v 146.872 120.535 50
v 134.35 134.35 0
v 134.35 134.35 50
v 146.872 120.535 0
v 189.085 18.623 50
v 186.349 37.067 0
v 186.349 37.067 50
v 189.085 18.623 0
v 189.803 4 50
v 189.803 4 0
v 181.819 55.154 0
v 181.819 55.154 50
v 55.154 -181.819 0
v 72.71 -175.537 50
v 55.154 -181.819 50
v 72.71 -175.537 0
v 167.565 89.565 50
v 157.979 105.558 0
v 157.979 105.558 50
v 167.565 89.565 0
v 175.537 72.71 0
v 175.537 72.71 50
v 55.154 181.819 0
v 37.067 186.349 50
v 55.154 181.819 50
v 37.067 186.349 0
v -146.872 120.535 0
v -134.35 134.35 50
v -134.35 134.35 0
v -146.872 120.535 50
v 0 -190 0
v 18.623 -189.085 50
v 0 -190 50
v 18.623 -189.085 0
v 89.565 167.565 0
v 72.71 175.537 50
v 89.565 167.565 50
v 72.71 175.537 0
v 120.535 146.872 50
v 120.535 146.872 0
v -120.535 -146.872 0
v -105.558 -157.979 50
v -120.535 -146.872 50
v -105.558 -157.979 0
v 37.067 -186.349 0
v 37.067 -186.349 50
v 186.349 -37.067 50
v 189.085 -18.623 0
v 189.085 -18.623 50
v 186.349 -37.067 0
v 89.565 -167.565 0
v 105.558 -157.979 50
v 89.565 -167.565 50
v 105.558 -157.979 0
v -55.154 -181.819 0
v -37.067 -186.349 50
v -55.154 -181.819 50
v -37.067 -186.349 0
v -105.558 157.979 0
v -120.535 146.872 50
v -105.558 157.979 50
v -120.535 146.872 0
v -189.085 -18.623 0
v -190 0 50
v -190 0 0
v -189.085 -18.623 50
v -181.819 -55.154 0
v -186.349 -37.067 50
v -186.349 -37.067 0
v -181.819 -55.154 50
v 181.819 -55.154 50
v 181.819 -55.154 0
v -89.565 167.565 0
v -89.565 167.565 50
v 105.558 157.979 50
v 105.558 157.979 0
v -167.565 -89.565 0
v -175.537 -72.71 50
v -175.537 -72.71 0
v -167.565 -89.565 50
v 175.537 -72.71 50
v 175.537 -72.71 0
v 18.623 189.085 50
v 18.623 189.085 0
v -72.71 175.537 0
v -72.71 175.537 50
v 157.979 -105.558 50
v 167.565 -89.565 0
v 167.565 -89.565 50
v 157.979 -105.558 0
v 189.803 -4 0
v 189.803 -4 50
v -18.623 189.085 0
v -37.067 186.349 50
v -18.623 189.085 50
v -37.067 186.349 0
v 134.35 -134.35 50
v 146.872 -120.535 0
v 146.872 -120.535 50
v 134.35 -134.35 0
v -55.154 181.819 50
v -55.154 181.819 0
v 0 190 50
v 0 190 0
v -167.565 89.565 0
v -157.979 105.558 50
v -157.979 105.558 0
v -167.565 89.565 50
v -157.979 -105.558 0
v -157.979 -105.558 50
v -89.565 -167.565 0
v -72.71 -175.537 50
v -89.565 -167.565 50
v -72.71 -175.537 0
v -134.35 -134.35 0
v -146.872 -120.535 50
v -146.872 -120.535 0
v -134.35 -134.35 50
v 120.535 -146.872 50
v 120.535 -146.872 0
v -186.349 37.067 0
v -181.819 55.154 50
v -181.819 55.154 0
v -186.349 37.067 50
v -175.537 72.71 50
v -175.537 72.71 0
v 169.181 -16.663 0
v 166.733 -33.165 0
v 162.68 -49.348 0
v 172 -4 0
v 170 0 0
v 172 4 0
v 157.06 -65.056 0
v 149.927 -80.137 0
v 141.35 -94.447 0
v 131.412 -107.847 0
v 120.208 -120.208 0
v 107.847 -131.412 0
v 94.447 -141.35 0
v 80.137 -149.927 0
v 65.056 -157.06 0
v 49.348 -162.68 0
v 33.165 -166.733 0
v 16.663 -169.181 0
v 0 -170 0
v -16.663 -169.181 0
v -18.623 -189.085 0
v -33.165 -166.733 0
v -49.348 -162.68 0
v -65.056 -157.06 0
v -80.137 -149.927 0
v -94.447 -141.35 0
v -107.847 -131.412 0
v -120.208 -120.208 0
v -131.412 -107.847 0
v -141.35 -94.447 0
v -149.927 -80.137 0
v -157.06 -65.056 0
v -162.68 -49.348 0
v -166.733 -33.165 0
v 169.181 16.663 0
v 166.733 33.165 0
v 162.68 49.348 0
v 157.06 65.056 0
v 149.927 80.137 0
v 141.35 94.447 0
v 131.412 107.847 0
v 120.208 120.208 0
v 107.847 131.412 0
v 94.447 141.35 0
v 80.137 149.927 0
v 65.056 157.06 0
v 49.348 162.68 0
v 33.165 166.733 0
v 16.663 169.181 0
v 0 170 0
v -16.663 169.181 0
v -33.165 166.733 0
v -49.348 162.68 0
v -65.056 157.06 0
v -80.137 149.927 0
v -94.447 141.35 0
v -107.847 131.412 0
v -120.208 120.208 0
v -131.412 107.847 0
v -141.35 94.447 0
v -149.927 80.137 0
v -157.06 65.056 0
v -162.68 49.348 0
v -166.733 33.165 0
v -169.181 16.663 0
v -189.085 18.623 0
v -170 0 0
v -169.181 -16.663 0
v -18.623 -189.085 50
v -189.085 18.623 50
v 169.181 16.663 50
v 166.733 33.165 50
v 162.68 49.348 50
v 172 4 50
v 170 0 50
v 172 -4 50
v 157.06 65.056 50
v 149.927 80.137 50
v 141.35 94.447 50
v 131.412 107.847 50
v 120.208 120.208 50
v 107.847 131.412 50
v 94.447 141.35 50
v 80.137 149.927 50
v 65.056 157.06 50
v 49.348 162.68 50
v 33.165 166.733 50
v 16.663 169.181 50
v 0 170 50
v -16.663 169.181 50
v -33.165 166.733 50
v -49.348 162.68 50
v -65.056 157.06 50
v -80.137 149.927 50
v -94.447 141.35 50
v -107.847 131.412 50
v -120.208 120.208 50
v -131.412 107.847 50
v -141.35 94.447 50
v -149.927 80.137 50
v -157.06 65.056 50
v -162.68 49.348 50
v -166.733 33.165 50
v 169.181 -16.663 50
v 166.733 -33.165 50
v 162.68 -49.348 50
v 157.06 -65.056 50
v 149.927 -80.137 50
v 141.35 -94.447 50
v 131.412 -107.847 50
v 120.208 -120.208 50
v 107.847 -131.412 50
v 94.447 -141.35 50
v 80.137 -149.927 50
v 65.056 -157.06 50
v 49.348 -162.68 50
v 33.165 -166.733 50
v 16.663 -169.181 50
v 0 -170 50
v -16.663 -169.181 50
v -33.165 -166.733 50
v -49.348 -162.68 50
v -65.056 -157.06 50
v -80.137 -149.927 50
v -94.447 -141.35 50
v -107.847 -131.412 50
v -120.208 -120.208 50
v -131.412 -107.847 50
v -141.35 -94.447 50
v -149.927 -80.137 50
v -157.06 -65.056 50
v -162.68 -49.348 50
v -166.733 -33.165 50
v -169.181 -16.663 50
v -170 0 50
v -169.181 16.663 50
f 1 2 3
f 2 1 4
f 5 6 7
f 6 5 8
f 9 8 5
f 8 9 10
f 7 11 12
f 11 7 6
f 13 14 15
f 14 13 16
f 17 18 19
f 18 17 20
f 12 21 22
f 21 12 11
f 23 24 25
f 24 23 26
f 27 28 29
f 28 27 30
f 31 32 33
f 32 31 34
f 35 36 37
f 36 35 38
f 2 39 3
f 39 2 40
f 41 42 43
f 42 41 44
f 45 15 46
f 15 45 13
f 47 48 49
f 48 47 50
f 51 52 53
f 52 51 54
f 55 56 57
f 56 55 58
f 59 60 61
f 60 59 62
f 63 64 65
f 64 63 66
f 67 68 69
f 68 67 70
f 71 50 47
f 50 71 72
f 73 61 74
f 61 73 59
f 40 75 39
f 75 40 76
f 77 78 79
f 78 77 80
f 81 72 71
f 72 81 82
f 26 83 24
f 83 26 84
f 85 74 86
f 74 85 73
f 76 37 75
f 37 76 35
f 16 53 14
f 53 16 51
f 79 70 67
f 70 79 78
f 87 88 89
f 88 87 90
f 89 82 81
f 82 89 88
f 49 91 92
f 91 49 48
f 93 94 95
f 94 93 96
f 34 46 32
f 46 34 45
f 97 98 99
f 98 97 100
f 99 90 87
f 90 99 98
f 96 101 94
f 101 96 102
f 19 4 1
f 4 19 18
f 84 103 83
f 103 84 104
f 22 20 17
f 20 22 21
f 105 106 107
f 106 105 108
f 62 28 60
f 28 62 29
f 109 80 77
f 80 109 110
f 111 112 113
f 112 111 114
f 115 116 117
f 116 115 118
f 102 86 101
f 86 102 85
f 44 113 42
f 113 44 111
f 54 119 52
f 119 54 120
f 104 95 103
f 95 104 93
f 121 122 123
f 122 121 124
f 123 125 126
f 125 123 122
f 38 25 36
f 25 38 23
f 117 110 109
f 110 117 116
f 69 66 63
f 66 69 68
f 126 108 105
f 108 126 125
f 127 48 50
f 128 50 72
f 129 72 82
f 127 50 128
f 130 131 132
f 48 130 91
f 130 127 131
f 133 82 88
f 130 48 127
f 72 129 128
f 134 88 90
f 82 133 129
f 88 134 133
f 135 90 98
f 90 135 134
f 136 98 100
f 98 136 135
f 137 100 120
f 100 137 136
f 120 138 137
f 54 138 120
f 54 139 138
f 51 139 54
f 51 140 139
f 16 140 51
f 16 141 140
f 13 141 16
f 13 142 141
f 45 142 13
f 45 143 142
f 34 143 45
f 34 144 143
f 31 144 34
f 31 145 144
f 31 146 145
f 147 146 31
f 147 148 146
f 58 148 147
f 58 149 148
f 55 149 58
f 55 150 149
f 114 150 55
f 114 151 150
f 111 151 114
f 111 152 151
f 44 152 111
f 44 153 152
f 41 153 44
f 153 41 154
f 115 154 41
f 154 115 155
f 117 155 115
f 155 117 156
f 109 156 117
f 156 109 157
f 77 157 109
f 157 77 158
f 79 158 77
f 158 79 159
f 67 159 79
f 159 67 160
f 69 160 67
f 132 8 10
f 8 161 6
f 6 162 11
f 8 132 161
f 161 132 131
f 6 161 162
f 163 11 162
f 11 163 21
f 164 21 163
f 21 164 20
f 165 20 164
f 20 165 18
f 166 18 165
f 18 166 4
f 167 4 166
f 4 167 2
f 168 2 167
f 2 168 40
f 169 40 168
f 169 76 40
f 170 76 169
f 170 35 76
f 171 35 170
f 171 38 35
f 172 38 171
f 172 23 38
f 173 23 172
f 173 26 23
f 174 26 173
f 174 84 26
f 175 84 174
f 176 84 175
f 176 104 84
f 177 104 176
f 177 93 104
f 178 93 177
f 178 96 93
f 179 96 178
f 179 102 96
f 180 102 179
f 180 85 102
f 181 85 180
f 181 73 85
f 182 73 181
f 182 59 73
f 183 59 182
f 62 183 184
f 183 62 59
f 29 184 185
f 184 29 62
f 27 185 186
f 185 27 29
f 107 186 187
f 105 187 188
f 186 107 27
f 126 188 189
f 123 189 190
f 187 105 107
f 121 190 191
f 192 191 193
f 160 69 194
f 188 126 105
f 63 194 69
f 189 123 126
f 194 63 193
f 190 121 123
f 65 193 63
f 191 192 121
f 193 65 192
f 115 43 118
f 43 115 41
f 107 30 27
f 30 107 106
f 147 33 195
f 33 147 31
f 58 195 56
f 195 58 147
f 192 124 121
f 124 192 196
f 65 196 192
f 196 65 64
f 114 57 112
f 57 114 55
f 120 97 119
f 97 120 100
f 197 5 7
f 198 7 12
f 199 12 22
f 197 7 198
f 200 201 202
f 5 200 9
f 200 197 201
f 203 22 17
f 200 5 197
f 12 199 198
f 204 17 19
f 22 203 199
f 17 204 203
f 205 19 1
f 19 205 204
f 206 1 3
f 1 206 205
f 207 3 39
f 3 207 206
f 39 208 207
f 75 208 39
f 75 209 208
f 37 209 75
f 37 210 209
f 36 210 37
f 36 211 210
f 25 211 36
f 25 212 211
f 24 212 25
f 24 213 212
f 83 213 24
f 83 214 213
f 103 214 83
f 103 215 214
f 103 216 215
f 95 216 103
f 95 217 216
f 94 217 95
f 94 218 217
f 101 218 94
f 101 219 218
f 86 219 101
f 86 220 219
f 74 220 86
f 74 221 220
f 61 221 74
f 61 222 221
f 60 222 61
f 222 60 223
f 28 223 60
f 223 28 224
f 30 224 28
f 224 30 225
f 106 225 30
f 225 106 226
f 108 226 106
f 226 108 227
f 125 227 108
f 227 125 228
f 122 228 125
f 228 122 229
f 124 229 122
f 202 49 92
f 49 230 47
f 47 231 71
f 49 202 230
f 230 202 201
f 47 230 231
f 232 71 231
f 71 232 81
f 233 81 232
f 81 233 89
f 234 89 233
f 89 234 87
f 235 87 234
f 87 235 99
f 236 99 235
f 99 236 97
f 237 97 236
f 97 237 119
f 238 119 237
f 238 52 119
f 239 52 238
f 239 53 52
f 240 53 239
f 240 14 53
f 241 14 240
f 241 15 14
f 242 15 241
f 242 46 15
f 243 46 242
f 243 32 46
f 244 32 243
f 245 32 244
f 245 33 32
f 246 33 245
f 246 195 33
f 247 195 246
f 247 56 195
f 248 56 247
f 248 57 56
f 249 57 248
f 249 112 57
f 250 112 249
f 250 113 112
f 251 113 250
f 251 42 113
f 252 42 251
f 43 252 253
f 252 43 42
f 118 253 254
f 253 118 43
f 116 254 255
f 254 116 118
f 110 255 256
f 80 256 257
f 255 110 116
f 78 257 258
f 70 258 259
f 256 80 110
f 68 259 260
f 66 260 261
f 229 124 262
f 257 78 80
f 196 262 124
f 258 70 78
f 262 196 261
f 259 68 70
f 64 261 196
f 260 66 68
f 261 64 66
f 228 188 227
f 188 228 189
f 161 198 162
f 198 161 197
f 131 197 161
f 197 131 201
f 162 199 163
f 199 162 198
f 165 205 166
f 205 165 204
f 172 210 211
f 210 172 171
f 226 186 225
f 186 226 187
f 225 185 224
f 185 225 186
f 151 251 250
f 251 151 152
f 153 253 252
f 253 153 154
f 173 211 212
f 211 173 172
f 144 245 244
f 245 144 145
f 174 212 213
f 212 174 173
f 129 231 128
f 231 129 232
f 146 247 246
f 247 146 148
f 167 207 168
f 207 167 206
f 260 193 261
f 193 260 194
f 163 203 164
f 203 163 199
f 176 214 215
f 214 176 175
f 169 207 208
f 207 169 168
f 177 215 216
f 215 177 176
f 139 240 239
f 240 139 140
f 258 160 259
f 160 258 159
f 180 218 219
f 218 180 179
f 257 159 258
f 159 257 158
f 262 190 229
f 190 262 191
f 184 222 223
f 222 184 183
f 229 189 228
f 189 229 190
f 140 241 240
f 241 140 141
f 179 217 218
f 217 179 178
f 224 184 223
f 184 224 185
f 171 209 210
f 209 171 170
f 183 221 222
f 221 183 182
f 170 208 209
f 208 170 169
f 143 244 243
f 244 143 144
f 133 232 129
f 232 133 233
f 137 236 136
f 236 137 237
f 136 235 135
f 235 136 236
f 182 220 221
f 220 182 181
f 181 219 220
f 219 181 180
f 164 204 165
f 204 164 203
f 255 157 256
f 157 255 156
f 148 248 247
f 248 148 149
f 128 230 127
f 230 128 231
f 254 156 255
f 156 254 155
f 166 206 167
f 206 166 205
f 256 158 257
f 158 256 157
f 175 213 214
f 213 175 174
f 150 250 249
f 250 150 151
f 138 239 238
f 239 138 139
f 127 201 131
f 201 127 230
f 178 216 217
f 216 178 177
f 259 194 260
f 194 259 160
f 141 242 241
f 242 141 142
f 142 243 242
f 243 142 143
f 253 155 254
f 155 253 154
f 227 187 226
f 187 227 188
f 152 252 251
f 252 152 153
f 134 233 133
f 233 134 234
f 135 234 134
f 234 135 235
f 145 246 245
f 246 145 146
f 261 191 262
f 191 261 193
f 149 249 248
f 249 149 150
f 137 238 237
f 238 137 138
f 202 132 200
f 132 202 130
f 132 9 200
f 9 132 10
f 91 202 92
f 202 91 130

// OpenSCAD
// file: ../params.scad
// Shared millimetre parameters. Keep in lockstep with freecad/params.py.
// Module scale: 150 kg/day wet train. Walls are CPVC sheet, not metal.

$fn = 36;

WALL        = 12;     // CPVC sheet thickness
FLOOR       = 16;     // floor plate (trough sits on this)

// LEACH CSTR 1 — inside liquor box
CSTR_L      = 2000;
CSTR_W      = 1200;
CSTR_H      = 1400;   // liquid + freeboard
FREEBOARD   = 200;

// CSTR 2 weir (same vessel, +X wall)
WEIR_W      = 450;
WEIR_CREST  = CSTR_H - FREEBOARD;   // from inner floor
WEIR_SLOT_H = 80;
WEIR_LIP    = 120;    // external spout projection

// CSTR 3 floor auger — injection-molded PVC / FG
AUGER_D     = 140;    // flight OD
AUGER_SHAFT = 40;
AUGER_PITCH = 110;
AUGER_TROUGH_W = 180;
AUGER_TROUGH_H = 110;
AUGER_OFFSET_Y = 280; // trough centreline from inner -Y wall
AUGER_INCLINE  = 28;  // deg, lifts out of liquor toward +X

// mixer / nozzles (lid)
MIXER_D     = 50;
GAS_D       = 80;     // acid-gas takeoff
DROP_X      = 80;     // inner-X of shred drop slot
DROP_L      = 400;
DROP_W      = 250;
DROP_COAM   = 80;     // raised coaming around the slot

// LEACHATE PUMP / coarse strainer — −X wall, opposite the weir
PUMP_D      = 80;     // DN80
PUMP_Z      = 450;    // centreline above inner floor (submerged)
PUMP_Y      = 900;    // centreline from inner −Y (away from auger)
STRAINER_L  = 180;
STRAINER_W  = 140;
STRAINER_H  = 160;

// mezzanine feed train
MEZZ_H      = 2200;   // platform top above tank outer floor
MEZZ_L      = 1600;   // platform length in −X
MEZZ_THK    = 12;
HOPPER_L    = 700;
HOPPER_W    = 600;
HOPPER_H    = 800;
SHRED_L     = 500;
SHRED_W     = 500;
SHRED_H     = 450;
CONV_W      = 240;
CONV_H      = 120;
CONV_PLATE  = 6;      // trough plate
CONV_FLANGE = 40;
CONV_SPRING_D = 50;
CONV_SPRING_H = 80;
CONV_BOLT   = 10;     // M10 clearance
CONV_LEN    = 1800;   // default standalone length; plant instance is computed
DUST_D      = 150;    // dust-hood outlet to DUST header
AUGER_LIFT_L = 700;

// dewater belts + split (Phase A 4–6)
FDEW_L      = 1800;
FDEW_W      = 450;
FDEW_H      = 80;
FDEW_RISE   = 120;    // solids end higher so liquor runs back to weir
SDEW_L      = 1400;
SDEW_W      = 220;
SDEW_H      = 80;
SPLIT_L     = 600;
SPLIT_W     = 500;
SPLIT_H     = 400;
STUB_L      = 400;
STUB_W      = 300;
STUB_H      = 250;

// EW funnel cell
EW_L        = 600;    // along aisle (overflow direction)
EW_W        = 420;    // anode-cathode depth
EW_H        = 650;    // rectangular body
EW_FUNNEL_H = 220;
EW_VALVE_D  = 50;
EW_VALVE_L  = 60;
EW_MEM_T    = 4;      // CEM
EW_SLOT     = 10;     // membrane cassette slot
EW_PITCH    = 750;    // aisle spacing, centre to centre
AISLE_X0    = 200;
AISLE_Y     = -(EW_W + 2*WALL) - 400;
AISLE_Z     = 400;
BUND_H      = 150;
BUND_PAD    = 250;
SUMP_L      = 400;
SUMP_W      = 400;
SUMP_H      = 300;
VDF_D       = 700;
VDF_L       = 900;
PAIL_W      = 180;
HDR_D       = 80;
HDR_Z       = 1400;
PYRO_D      = 320;
PYRO_L      = 2800;

// Campus envelopes — lockstep with freecad/params.py
FARM_X=12000; FARM_Y=8000; FARM_L=12000; FARM_W=8000; FARM_H=4500;
FAB_X=12000;  FAB_Y=-6000; FAB_L=8000;   FAB_W=6000;  FAB_H=4000;
HAB_X=-8000;  HAB_Y=8000;  HAB_L=8000;   HAB_W=6000;  HAB_H=3200;
CRYO_X=-6000; CRYO_Y=-4000; CRYO_L=4000; CRYO_W=3000; CRYO_H=3000;
MFG_X=2000;   MFG_Y=9000;  MFG_L=6000;   MFG_W=4000;  MFG_H=3500;

LIFE_Z_GREY=900; LIFE_Z_UPW=1100; LIFE_Z_ETCH=1300;
LIFE_Z_O2=2800; LIFE_Z_N2=3000; LIFE_Z_CO2=3200;
LIFE_D_GREY=50; LIFE_D_UPW=40; LIFE_D_ETCH=32;
LIFE_D_GAS=25; LIFE_D_CO2=40;
// main file
// Single induction ring that sits on the Ti pyro shell. Repeat along PYRO_L.
include <../params.scad>;
$fn = 64;

coil_id = PYRO_D + 20;
coil_od = coil_id + 40;
coil_h  = 50;

module coil() {
    difference() {
        cylinder(h=coil_h, d=coil_od);
        translate([0, 0, -1]) cylinder(h=coil_h + 2, d=coil_id);
        translate([coil_od/2 - 8, 0, coil_h/2])
            cube([20, 8, coil_h + 2], center=true);
    }
}

coil();
